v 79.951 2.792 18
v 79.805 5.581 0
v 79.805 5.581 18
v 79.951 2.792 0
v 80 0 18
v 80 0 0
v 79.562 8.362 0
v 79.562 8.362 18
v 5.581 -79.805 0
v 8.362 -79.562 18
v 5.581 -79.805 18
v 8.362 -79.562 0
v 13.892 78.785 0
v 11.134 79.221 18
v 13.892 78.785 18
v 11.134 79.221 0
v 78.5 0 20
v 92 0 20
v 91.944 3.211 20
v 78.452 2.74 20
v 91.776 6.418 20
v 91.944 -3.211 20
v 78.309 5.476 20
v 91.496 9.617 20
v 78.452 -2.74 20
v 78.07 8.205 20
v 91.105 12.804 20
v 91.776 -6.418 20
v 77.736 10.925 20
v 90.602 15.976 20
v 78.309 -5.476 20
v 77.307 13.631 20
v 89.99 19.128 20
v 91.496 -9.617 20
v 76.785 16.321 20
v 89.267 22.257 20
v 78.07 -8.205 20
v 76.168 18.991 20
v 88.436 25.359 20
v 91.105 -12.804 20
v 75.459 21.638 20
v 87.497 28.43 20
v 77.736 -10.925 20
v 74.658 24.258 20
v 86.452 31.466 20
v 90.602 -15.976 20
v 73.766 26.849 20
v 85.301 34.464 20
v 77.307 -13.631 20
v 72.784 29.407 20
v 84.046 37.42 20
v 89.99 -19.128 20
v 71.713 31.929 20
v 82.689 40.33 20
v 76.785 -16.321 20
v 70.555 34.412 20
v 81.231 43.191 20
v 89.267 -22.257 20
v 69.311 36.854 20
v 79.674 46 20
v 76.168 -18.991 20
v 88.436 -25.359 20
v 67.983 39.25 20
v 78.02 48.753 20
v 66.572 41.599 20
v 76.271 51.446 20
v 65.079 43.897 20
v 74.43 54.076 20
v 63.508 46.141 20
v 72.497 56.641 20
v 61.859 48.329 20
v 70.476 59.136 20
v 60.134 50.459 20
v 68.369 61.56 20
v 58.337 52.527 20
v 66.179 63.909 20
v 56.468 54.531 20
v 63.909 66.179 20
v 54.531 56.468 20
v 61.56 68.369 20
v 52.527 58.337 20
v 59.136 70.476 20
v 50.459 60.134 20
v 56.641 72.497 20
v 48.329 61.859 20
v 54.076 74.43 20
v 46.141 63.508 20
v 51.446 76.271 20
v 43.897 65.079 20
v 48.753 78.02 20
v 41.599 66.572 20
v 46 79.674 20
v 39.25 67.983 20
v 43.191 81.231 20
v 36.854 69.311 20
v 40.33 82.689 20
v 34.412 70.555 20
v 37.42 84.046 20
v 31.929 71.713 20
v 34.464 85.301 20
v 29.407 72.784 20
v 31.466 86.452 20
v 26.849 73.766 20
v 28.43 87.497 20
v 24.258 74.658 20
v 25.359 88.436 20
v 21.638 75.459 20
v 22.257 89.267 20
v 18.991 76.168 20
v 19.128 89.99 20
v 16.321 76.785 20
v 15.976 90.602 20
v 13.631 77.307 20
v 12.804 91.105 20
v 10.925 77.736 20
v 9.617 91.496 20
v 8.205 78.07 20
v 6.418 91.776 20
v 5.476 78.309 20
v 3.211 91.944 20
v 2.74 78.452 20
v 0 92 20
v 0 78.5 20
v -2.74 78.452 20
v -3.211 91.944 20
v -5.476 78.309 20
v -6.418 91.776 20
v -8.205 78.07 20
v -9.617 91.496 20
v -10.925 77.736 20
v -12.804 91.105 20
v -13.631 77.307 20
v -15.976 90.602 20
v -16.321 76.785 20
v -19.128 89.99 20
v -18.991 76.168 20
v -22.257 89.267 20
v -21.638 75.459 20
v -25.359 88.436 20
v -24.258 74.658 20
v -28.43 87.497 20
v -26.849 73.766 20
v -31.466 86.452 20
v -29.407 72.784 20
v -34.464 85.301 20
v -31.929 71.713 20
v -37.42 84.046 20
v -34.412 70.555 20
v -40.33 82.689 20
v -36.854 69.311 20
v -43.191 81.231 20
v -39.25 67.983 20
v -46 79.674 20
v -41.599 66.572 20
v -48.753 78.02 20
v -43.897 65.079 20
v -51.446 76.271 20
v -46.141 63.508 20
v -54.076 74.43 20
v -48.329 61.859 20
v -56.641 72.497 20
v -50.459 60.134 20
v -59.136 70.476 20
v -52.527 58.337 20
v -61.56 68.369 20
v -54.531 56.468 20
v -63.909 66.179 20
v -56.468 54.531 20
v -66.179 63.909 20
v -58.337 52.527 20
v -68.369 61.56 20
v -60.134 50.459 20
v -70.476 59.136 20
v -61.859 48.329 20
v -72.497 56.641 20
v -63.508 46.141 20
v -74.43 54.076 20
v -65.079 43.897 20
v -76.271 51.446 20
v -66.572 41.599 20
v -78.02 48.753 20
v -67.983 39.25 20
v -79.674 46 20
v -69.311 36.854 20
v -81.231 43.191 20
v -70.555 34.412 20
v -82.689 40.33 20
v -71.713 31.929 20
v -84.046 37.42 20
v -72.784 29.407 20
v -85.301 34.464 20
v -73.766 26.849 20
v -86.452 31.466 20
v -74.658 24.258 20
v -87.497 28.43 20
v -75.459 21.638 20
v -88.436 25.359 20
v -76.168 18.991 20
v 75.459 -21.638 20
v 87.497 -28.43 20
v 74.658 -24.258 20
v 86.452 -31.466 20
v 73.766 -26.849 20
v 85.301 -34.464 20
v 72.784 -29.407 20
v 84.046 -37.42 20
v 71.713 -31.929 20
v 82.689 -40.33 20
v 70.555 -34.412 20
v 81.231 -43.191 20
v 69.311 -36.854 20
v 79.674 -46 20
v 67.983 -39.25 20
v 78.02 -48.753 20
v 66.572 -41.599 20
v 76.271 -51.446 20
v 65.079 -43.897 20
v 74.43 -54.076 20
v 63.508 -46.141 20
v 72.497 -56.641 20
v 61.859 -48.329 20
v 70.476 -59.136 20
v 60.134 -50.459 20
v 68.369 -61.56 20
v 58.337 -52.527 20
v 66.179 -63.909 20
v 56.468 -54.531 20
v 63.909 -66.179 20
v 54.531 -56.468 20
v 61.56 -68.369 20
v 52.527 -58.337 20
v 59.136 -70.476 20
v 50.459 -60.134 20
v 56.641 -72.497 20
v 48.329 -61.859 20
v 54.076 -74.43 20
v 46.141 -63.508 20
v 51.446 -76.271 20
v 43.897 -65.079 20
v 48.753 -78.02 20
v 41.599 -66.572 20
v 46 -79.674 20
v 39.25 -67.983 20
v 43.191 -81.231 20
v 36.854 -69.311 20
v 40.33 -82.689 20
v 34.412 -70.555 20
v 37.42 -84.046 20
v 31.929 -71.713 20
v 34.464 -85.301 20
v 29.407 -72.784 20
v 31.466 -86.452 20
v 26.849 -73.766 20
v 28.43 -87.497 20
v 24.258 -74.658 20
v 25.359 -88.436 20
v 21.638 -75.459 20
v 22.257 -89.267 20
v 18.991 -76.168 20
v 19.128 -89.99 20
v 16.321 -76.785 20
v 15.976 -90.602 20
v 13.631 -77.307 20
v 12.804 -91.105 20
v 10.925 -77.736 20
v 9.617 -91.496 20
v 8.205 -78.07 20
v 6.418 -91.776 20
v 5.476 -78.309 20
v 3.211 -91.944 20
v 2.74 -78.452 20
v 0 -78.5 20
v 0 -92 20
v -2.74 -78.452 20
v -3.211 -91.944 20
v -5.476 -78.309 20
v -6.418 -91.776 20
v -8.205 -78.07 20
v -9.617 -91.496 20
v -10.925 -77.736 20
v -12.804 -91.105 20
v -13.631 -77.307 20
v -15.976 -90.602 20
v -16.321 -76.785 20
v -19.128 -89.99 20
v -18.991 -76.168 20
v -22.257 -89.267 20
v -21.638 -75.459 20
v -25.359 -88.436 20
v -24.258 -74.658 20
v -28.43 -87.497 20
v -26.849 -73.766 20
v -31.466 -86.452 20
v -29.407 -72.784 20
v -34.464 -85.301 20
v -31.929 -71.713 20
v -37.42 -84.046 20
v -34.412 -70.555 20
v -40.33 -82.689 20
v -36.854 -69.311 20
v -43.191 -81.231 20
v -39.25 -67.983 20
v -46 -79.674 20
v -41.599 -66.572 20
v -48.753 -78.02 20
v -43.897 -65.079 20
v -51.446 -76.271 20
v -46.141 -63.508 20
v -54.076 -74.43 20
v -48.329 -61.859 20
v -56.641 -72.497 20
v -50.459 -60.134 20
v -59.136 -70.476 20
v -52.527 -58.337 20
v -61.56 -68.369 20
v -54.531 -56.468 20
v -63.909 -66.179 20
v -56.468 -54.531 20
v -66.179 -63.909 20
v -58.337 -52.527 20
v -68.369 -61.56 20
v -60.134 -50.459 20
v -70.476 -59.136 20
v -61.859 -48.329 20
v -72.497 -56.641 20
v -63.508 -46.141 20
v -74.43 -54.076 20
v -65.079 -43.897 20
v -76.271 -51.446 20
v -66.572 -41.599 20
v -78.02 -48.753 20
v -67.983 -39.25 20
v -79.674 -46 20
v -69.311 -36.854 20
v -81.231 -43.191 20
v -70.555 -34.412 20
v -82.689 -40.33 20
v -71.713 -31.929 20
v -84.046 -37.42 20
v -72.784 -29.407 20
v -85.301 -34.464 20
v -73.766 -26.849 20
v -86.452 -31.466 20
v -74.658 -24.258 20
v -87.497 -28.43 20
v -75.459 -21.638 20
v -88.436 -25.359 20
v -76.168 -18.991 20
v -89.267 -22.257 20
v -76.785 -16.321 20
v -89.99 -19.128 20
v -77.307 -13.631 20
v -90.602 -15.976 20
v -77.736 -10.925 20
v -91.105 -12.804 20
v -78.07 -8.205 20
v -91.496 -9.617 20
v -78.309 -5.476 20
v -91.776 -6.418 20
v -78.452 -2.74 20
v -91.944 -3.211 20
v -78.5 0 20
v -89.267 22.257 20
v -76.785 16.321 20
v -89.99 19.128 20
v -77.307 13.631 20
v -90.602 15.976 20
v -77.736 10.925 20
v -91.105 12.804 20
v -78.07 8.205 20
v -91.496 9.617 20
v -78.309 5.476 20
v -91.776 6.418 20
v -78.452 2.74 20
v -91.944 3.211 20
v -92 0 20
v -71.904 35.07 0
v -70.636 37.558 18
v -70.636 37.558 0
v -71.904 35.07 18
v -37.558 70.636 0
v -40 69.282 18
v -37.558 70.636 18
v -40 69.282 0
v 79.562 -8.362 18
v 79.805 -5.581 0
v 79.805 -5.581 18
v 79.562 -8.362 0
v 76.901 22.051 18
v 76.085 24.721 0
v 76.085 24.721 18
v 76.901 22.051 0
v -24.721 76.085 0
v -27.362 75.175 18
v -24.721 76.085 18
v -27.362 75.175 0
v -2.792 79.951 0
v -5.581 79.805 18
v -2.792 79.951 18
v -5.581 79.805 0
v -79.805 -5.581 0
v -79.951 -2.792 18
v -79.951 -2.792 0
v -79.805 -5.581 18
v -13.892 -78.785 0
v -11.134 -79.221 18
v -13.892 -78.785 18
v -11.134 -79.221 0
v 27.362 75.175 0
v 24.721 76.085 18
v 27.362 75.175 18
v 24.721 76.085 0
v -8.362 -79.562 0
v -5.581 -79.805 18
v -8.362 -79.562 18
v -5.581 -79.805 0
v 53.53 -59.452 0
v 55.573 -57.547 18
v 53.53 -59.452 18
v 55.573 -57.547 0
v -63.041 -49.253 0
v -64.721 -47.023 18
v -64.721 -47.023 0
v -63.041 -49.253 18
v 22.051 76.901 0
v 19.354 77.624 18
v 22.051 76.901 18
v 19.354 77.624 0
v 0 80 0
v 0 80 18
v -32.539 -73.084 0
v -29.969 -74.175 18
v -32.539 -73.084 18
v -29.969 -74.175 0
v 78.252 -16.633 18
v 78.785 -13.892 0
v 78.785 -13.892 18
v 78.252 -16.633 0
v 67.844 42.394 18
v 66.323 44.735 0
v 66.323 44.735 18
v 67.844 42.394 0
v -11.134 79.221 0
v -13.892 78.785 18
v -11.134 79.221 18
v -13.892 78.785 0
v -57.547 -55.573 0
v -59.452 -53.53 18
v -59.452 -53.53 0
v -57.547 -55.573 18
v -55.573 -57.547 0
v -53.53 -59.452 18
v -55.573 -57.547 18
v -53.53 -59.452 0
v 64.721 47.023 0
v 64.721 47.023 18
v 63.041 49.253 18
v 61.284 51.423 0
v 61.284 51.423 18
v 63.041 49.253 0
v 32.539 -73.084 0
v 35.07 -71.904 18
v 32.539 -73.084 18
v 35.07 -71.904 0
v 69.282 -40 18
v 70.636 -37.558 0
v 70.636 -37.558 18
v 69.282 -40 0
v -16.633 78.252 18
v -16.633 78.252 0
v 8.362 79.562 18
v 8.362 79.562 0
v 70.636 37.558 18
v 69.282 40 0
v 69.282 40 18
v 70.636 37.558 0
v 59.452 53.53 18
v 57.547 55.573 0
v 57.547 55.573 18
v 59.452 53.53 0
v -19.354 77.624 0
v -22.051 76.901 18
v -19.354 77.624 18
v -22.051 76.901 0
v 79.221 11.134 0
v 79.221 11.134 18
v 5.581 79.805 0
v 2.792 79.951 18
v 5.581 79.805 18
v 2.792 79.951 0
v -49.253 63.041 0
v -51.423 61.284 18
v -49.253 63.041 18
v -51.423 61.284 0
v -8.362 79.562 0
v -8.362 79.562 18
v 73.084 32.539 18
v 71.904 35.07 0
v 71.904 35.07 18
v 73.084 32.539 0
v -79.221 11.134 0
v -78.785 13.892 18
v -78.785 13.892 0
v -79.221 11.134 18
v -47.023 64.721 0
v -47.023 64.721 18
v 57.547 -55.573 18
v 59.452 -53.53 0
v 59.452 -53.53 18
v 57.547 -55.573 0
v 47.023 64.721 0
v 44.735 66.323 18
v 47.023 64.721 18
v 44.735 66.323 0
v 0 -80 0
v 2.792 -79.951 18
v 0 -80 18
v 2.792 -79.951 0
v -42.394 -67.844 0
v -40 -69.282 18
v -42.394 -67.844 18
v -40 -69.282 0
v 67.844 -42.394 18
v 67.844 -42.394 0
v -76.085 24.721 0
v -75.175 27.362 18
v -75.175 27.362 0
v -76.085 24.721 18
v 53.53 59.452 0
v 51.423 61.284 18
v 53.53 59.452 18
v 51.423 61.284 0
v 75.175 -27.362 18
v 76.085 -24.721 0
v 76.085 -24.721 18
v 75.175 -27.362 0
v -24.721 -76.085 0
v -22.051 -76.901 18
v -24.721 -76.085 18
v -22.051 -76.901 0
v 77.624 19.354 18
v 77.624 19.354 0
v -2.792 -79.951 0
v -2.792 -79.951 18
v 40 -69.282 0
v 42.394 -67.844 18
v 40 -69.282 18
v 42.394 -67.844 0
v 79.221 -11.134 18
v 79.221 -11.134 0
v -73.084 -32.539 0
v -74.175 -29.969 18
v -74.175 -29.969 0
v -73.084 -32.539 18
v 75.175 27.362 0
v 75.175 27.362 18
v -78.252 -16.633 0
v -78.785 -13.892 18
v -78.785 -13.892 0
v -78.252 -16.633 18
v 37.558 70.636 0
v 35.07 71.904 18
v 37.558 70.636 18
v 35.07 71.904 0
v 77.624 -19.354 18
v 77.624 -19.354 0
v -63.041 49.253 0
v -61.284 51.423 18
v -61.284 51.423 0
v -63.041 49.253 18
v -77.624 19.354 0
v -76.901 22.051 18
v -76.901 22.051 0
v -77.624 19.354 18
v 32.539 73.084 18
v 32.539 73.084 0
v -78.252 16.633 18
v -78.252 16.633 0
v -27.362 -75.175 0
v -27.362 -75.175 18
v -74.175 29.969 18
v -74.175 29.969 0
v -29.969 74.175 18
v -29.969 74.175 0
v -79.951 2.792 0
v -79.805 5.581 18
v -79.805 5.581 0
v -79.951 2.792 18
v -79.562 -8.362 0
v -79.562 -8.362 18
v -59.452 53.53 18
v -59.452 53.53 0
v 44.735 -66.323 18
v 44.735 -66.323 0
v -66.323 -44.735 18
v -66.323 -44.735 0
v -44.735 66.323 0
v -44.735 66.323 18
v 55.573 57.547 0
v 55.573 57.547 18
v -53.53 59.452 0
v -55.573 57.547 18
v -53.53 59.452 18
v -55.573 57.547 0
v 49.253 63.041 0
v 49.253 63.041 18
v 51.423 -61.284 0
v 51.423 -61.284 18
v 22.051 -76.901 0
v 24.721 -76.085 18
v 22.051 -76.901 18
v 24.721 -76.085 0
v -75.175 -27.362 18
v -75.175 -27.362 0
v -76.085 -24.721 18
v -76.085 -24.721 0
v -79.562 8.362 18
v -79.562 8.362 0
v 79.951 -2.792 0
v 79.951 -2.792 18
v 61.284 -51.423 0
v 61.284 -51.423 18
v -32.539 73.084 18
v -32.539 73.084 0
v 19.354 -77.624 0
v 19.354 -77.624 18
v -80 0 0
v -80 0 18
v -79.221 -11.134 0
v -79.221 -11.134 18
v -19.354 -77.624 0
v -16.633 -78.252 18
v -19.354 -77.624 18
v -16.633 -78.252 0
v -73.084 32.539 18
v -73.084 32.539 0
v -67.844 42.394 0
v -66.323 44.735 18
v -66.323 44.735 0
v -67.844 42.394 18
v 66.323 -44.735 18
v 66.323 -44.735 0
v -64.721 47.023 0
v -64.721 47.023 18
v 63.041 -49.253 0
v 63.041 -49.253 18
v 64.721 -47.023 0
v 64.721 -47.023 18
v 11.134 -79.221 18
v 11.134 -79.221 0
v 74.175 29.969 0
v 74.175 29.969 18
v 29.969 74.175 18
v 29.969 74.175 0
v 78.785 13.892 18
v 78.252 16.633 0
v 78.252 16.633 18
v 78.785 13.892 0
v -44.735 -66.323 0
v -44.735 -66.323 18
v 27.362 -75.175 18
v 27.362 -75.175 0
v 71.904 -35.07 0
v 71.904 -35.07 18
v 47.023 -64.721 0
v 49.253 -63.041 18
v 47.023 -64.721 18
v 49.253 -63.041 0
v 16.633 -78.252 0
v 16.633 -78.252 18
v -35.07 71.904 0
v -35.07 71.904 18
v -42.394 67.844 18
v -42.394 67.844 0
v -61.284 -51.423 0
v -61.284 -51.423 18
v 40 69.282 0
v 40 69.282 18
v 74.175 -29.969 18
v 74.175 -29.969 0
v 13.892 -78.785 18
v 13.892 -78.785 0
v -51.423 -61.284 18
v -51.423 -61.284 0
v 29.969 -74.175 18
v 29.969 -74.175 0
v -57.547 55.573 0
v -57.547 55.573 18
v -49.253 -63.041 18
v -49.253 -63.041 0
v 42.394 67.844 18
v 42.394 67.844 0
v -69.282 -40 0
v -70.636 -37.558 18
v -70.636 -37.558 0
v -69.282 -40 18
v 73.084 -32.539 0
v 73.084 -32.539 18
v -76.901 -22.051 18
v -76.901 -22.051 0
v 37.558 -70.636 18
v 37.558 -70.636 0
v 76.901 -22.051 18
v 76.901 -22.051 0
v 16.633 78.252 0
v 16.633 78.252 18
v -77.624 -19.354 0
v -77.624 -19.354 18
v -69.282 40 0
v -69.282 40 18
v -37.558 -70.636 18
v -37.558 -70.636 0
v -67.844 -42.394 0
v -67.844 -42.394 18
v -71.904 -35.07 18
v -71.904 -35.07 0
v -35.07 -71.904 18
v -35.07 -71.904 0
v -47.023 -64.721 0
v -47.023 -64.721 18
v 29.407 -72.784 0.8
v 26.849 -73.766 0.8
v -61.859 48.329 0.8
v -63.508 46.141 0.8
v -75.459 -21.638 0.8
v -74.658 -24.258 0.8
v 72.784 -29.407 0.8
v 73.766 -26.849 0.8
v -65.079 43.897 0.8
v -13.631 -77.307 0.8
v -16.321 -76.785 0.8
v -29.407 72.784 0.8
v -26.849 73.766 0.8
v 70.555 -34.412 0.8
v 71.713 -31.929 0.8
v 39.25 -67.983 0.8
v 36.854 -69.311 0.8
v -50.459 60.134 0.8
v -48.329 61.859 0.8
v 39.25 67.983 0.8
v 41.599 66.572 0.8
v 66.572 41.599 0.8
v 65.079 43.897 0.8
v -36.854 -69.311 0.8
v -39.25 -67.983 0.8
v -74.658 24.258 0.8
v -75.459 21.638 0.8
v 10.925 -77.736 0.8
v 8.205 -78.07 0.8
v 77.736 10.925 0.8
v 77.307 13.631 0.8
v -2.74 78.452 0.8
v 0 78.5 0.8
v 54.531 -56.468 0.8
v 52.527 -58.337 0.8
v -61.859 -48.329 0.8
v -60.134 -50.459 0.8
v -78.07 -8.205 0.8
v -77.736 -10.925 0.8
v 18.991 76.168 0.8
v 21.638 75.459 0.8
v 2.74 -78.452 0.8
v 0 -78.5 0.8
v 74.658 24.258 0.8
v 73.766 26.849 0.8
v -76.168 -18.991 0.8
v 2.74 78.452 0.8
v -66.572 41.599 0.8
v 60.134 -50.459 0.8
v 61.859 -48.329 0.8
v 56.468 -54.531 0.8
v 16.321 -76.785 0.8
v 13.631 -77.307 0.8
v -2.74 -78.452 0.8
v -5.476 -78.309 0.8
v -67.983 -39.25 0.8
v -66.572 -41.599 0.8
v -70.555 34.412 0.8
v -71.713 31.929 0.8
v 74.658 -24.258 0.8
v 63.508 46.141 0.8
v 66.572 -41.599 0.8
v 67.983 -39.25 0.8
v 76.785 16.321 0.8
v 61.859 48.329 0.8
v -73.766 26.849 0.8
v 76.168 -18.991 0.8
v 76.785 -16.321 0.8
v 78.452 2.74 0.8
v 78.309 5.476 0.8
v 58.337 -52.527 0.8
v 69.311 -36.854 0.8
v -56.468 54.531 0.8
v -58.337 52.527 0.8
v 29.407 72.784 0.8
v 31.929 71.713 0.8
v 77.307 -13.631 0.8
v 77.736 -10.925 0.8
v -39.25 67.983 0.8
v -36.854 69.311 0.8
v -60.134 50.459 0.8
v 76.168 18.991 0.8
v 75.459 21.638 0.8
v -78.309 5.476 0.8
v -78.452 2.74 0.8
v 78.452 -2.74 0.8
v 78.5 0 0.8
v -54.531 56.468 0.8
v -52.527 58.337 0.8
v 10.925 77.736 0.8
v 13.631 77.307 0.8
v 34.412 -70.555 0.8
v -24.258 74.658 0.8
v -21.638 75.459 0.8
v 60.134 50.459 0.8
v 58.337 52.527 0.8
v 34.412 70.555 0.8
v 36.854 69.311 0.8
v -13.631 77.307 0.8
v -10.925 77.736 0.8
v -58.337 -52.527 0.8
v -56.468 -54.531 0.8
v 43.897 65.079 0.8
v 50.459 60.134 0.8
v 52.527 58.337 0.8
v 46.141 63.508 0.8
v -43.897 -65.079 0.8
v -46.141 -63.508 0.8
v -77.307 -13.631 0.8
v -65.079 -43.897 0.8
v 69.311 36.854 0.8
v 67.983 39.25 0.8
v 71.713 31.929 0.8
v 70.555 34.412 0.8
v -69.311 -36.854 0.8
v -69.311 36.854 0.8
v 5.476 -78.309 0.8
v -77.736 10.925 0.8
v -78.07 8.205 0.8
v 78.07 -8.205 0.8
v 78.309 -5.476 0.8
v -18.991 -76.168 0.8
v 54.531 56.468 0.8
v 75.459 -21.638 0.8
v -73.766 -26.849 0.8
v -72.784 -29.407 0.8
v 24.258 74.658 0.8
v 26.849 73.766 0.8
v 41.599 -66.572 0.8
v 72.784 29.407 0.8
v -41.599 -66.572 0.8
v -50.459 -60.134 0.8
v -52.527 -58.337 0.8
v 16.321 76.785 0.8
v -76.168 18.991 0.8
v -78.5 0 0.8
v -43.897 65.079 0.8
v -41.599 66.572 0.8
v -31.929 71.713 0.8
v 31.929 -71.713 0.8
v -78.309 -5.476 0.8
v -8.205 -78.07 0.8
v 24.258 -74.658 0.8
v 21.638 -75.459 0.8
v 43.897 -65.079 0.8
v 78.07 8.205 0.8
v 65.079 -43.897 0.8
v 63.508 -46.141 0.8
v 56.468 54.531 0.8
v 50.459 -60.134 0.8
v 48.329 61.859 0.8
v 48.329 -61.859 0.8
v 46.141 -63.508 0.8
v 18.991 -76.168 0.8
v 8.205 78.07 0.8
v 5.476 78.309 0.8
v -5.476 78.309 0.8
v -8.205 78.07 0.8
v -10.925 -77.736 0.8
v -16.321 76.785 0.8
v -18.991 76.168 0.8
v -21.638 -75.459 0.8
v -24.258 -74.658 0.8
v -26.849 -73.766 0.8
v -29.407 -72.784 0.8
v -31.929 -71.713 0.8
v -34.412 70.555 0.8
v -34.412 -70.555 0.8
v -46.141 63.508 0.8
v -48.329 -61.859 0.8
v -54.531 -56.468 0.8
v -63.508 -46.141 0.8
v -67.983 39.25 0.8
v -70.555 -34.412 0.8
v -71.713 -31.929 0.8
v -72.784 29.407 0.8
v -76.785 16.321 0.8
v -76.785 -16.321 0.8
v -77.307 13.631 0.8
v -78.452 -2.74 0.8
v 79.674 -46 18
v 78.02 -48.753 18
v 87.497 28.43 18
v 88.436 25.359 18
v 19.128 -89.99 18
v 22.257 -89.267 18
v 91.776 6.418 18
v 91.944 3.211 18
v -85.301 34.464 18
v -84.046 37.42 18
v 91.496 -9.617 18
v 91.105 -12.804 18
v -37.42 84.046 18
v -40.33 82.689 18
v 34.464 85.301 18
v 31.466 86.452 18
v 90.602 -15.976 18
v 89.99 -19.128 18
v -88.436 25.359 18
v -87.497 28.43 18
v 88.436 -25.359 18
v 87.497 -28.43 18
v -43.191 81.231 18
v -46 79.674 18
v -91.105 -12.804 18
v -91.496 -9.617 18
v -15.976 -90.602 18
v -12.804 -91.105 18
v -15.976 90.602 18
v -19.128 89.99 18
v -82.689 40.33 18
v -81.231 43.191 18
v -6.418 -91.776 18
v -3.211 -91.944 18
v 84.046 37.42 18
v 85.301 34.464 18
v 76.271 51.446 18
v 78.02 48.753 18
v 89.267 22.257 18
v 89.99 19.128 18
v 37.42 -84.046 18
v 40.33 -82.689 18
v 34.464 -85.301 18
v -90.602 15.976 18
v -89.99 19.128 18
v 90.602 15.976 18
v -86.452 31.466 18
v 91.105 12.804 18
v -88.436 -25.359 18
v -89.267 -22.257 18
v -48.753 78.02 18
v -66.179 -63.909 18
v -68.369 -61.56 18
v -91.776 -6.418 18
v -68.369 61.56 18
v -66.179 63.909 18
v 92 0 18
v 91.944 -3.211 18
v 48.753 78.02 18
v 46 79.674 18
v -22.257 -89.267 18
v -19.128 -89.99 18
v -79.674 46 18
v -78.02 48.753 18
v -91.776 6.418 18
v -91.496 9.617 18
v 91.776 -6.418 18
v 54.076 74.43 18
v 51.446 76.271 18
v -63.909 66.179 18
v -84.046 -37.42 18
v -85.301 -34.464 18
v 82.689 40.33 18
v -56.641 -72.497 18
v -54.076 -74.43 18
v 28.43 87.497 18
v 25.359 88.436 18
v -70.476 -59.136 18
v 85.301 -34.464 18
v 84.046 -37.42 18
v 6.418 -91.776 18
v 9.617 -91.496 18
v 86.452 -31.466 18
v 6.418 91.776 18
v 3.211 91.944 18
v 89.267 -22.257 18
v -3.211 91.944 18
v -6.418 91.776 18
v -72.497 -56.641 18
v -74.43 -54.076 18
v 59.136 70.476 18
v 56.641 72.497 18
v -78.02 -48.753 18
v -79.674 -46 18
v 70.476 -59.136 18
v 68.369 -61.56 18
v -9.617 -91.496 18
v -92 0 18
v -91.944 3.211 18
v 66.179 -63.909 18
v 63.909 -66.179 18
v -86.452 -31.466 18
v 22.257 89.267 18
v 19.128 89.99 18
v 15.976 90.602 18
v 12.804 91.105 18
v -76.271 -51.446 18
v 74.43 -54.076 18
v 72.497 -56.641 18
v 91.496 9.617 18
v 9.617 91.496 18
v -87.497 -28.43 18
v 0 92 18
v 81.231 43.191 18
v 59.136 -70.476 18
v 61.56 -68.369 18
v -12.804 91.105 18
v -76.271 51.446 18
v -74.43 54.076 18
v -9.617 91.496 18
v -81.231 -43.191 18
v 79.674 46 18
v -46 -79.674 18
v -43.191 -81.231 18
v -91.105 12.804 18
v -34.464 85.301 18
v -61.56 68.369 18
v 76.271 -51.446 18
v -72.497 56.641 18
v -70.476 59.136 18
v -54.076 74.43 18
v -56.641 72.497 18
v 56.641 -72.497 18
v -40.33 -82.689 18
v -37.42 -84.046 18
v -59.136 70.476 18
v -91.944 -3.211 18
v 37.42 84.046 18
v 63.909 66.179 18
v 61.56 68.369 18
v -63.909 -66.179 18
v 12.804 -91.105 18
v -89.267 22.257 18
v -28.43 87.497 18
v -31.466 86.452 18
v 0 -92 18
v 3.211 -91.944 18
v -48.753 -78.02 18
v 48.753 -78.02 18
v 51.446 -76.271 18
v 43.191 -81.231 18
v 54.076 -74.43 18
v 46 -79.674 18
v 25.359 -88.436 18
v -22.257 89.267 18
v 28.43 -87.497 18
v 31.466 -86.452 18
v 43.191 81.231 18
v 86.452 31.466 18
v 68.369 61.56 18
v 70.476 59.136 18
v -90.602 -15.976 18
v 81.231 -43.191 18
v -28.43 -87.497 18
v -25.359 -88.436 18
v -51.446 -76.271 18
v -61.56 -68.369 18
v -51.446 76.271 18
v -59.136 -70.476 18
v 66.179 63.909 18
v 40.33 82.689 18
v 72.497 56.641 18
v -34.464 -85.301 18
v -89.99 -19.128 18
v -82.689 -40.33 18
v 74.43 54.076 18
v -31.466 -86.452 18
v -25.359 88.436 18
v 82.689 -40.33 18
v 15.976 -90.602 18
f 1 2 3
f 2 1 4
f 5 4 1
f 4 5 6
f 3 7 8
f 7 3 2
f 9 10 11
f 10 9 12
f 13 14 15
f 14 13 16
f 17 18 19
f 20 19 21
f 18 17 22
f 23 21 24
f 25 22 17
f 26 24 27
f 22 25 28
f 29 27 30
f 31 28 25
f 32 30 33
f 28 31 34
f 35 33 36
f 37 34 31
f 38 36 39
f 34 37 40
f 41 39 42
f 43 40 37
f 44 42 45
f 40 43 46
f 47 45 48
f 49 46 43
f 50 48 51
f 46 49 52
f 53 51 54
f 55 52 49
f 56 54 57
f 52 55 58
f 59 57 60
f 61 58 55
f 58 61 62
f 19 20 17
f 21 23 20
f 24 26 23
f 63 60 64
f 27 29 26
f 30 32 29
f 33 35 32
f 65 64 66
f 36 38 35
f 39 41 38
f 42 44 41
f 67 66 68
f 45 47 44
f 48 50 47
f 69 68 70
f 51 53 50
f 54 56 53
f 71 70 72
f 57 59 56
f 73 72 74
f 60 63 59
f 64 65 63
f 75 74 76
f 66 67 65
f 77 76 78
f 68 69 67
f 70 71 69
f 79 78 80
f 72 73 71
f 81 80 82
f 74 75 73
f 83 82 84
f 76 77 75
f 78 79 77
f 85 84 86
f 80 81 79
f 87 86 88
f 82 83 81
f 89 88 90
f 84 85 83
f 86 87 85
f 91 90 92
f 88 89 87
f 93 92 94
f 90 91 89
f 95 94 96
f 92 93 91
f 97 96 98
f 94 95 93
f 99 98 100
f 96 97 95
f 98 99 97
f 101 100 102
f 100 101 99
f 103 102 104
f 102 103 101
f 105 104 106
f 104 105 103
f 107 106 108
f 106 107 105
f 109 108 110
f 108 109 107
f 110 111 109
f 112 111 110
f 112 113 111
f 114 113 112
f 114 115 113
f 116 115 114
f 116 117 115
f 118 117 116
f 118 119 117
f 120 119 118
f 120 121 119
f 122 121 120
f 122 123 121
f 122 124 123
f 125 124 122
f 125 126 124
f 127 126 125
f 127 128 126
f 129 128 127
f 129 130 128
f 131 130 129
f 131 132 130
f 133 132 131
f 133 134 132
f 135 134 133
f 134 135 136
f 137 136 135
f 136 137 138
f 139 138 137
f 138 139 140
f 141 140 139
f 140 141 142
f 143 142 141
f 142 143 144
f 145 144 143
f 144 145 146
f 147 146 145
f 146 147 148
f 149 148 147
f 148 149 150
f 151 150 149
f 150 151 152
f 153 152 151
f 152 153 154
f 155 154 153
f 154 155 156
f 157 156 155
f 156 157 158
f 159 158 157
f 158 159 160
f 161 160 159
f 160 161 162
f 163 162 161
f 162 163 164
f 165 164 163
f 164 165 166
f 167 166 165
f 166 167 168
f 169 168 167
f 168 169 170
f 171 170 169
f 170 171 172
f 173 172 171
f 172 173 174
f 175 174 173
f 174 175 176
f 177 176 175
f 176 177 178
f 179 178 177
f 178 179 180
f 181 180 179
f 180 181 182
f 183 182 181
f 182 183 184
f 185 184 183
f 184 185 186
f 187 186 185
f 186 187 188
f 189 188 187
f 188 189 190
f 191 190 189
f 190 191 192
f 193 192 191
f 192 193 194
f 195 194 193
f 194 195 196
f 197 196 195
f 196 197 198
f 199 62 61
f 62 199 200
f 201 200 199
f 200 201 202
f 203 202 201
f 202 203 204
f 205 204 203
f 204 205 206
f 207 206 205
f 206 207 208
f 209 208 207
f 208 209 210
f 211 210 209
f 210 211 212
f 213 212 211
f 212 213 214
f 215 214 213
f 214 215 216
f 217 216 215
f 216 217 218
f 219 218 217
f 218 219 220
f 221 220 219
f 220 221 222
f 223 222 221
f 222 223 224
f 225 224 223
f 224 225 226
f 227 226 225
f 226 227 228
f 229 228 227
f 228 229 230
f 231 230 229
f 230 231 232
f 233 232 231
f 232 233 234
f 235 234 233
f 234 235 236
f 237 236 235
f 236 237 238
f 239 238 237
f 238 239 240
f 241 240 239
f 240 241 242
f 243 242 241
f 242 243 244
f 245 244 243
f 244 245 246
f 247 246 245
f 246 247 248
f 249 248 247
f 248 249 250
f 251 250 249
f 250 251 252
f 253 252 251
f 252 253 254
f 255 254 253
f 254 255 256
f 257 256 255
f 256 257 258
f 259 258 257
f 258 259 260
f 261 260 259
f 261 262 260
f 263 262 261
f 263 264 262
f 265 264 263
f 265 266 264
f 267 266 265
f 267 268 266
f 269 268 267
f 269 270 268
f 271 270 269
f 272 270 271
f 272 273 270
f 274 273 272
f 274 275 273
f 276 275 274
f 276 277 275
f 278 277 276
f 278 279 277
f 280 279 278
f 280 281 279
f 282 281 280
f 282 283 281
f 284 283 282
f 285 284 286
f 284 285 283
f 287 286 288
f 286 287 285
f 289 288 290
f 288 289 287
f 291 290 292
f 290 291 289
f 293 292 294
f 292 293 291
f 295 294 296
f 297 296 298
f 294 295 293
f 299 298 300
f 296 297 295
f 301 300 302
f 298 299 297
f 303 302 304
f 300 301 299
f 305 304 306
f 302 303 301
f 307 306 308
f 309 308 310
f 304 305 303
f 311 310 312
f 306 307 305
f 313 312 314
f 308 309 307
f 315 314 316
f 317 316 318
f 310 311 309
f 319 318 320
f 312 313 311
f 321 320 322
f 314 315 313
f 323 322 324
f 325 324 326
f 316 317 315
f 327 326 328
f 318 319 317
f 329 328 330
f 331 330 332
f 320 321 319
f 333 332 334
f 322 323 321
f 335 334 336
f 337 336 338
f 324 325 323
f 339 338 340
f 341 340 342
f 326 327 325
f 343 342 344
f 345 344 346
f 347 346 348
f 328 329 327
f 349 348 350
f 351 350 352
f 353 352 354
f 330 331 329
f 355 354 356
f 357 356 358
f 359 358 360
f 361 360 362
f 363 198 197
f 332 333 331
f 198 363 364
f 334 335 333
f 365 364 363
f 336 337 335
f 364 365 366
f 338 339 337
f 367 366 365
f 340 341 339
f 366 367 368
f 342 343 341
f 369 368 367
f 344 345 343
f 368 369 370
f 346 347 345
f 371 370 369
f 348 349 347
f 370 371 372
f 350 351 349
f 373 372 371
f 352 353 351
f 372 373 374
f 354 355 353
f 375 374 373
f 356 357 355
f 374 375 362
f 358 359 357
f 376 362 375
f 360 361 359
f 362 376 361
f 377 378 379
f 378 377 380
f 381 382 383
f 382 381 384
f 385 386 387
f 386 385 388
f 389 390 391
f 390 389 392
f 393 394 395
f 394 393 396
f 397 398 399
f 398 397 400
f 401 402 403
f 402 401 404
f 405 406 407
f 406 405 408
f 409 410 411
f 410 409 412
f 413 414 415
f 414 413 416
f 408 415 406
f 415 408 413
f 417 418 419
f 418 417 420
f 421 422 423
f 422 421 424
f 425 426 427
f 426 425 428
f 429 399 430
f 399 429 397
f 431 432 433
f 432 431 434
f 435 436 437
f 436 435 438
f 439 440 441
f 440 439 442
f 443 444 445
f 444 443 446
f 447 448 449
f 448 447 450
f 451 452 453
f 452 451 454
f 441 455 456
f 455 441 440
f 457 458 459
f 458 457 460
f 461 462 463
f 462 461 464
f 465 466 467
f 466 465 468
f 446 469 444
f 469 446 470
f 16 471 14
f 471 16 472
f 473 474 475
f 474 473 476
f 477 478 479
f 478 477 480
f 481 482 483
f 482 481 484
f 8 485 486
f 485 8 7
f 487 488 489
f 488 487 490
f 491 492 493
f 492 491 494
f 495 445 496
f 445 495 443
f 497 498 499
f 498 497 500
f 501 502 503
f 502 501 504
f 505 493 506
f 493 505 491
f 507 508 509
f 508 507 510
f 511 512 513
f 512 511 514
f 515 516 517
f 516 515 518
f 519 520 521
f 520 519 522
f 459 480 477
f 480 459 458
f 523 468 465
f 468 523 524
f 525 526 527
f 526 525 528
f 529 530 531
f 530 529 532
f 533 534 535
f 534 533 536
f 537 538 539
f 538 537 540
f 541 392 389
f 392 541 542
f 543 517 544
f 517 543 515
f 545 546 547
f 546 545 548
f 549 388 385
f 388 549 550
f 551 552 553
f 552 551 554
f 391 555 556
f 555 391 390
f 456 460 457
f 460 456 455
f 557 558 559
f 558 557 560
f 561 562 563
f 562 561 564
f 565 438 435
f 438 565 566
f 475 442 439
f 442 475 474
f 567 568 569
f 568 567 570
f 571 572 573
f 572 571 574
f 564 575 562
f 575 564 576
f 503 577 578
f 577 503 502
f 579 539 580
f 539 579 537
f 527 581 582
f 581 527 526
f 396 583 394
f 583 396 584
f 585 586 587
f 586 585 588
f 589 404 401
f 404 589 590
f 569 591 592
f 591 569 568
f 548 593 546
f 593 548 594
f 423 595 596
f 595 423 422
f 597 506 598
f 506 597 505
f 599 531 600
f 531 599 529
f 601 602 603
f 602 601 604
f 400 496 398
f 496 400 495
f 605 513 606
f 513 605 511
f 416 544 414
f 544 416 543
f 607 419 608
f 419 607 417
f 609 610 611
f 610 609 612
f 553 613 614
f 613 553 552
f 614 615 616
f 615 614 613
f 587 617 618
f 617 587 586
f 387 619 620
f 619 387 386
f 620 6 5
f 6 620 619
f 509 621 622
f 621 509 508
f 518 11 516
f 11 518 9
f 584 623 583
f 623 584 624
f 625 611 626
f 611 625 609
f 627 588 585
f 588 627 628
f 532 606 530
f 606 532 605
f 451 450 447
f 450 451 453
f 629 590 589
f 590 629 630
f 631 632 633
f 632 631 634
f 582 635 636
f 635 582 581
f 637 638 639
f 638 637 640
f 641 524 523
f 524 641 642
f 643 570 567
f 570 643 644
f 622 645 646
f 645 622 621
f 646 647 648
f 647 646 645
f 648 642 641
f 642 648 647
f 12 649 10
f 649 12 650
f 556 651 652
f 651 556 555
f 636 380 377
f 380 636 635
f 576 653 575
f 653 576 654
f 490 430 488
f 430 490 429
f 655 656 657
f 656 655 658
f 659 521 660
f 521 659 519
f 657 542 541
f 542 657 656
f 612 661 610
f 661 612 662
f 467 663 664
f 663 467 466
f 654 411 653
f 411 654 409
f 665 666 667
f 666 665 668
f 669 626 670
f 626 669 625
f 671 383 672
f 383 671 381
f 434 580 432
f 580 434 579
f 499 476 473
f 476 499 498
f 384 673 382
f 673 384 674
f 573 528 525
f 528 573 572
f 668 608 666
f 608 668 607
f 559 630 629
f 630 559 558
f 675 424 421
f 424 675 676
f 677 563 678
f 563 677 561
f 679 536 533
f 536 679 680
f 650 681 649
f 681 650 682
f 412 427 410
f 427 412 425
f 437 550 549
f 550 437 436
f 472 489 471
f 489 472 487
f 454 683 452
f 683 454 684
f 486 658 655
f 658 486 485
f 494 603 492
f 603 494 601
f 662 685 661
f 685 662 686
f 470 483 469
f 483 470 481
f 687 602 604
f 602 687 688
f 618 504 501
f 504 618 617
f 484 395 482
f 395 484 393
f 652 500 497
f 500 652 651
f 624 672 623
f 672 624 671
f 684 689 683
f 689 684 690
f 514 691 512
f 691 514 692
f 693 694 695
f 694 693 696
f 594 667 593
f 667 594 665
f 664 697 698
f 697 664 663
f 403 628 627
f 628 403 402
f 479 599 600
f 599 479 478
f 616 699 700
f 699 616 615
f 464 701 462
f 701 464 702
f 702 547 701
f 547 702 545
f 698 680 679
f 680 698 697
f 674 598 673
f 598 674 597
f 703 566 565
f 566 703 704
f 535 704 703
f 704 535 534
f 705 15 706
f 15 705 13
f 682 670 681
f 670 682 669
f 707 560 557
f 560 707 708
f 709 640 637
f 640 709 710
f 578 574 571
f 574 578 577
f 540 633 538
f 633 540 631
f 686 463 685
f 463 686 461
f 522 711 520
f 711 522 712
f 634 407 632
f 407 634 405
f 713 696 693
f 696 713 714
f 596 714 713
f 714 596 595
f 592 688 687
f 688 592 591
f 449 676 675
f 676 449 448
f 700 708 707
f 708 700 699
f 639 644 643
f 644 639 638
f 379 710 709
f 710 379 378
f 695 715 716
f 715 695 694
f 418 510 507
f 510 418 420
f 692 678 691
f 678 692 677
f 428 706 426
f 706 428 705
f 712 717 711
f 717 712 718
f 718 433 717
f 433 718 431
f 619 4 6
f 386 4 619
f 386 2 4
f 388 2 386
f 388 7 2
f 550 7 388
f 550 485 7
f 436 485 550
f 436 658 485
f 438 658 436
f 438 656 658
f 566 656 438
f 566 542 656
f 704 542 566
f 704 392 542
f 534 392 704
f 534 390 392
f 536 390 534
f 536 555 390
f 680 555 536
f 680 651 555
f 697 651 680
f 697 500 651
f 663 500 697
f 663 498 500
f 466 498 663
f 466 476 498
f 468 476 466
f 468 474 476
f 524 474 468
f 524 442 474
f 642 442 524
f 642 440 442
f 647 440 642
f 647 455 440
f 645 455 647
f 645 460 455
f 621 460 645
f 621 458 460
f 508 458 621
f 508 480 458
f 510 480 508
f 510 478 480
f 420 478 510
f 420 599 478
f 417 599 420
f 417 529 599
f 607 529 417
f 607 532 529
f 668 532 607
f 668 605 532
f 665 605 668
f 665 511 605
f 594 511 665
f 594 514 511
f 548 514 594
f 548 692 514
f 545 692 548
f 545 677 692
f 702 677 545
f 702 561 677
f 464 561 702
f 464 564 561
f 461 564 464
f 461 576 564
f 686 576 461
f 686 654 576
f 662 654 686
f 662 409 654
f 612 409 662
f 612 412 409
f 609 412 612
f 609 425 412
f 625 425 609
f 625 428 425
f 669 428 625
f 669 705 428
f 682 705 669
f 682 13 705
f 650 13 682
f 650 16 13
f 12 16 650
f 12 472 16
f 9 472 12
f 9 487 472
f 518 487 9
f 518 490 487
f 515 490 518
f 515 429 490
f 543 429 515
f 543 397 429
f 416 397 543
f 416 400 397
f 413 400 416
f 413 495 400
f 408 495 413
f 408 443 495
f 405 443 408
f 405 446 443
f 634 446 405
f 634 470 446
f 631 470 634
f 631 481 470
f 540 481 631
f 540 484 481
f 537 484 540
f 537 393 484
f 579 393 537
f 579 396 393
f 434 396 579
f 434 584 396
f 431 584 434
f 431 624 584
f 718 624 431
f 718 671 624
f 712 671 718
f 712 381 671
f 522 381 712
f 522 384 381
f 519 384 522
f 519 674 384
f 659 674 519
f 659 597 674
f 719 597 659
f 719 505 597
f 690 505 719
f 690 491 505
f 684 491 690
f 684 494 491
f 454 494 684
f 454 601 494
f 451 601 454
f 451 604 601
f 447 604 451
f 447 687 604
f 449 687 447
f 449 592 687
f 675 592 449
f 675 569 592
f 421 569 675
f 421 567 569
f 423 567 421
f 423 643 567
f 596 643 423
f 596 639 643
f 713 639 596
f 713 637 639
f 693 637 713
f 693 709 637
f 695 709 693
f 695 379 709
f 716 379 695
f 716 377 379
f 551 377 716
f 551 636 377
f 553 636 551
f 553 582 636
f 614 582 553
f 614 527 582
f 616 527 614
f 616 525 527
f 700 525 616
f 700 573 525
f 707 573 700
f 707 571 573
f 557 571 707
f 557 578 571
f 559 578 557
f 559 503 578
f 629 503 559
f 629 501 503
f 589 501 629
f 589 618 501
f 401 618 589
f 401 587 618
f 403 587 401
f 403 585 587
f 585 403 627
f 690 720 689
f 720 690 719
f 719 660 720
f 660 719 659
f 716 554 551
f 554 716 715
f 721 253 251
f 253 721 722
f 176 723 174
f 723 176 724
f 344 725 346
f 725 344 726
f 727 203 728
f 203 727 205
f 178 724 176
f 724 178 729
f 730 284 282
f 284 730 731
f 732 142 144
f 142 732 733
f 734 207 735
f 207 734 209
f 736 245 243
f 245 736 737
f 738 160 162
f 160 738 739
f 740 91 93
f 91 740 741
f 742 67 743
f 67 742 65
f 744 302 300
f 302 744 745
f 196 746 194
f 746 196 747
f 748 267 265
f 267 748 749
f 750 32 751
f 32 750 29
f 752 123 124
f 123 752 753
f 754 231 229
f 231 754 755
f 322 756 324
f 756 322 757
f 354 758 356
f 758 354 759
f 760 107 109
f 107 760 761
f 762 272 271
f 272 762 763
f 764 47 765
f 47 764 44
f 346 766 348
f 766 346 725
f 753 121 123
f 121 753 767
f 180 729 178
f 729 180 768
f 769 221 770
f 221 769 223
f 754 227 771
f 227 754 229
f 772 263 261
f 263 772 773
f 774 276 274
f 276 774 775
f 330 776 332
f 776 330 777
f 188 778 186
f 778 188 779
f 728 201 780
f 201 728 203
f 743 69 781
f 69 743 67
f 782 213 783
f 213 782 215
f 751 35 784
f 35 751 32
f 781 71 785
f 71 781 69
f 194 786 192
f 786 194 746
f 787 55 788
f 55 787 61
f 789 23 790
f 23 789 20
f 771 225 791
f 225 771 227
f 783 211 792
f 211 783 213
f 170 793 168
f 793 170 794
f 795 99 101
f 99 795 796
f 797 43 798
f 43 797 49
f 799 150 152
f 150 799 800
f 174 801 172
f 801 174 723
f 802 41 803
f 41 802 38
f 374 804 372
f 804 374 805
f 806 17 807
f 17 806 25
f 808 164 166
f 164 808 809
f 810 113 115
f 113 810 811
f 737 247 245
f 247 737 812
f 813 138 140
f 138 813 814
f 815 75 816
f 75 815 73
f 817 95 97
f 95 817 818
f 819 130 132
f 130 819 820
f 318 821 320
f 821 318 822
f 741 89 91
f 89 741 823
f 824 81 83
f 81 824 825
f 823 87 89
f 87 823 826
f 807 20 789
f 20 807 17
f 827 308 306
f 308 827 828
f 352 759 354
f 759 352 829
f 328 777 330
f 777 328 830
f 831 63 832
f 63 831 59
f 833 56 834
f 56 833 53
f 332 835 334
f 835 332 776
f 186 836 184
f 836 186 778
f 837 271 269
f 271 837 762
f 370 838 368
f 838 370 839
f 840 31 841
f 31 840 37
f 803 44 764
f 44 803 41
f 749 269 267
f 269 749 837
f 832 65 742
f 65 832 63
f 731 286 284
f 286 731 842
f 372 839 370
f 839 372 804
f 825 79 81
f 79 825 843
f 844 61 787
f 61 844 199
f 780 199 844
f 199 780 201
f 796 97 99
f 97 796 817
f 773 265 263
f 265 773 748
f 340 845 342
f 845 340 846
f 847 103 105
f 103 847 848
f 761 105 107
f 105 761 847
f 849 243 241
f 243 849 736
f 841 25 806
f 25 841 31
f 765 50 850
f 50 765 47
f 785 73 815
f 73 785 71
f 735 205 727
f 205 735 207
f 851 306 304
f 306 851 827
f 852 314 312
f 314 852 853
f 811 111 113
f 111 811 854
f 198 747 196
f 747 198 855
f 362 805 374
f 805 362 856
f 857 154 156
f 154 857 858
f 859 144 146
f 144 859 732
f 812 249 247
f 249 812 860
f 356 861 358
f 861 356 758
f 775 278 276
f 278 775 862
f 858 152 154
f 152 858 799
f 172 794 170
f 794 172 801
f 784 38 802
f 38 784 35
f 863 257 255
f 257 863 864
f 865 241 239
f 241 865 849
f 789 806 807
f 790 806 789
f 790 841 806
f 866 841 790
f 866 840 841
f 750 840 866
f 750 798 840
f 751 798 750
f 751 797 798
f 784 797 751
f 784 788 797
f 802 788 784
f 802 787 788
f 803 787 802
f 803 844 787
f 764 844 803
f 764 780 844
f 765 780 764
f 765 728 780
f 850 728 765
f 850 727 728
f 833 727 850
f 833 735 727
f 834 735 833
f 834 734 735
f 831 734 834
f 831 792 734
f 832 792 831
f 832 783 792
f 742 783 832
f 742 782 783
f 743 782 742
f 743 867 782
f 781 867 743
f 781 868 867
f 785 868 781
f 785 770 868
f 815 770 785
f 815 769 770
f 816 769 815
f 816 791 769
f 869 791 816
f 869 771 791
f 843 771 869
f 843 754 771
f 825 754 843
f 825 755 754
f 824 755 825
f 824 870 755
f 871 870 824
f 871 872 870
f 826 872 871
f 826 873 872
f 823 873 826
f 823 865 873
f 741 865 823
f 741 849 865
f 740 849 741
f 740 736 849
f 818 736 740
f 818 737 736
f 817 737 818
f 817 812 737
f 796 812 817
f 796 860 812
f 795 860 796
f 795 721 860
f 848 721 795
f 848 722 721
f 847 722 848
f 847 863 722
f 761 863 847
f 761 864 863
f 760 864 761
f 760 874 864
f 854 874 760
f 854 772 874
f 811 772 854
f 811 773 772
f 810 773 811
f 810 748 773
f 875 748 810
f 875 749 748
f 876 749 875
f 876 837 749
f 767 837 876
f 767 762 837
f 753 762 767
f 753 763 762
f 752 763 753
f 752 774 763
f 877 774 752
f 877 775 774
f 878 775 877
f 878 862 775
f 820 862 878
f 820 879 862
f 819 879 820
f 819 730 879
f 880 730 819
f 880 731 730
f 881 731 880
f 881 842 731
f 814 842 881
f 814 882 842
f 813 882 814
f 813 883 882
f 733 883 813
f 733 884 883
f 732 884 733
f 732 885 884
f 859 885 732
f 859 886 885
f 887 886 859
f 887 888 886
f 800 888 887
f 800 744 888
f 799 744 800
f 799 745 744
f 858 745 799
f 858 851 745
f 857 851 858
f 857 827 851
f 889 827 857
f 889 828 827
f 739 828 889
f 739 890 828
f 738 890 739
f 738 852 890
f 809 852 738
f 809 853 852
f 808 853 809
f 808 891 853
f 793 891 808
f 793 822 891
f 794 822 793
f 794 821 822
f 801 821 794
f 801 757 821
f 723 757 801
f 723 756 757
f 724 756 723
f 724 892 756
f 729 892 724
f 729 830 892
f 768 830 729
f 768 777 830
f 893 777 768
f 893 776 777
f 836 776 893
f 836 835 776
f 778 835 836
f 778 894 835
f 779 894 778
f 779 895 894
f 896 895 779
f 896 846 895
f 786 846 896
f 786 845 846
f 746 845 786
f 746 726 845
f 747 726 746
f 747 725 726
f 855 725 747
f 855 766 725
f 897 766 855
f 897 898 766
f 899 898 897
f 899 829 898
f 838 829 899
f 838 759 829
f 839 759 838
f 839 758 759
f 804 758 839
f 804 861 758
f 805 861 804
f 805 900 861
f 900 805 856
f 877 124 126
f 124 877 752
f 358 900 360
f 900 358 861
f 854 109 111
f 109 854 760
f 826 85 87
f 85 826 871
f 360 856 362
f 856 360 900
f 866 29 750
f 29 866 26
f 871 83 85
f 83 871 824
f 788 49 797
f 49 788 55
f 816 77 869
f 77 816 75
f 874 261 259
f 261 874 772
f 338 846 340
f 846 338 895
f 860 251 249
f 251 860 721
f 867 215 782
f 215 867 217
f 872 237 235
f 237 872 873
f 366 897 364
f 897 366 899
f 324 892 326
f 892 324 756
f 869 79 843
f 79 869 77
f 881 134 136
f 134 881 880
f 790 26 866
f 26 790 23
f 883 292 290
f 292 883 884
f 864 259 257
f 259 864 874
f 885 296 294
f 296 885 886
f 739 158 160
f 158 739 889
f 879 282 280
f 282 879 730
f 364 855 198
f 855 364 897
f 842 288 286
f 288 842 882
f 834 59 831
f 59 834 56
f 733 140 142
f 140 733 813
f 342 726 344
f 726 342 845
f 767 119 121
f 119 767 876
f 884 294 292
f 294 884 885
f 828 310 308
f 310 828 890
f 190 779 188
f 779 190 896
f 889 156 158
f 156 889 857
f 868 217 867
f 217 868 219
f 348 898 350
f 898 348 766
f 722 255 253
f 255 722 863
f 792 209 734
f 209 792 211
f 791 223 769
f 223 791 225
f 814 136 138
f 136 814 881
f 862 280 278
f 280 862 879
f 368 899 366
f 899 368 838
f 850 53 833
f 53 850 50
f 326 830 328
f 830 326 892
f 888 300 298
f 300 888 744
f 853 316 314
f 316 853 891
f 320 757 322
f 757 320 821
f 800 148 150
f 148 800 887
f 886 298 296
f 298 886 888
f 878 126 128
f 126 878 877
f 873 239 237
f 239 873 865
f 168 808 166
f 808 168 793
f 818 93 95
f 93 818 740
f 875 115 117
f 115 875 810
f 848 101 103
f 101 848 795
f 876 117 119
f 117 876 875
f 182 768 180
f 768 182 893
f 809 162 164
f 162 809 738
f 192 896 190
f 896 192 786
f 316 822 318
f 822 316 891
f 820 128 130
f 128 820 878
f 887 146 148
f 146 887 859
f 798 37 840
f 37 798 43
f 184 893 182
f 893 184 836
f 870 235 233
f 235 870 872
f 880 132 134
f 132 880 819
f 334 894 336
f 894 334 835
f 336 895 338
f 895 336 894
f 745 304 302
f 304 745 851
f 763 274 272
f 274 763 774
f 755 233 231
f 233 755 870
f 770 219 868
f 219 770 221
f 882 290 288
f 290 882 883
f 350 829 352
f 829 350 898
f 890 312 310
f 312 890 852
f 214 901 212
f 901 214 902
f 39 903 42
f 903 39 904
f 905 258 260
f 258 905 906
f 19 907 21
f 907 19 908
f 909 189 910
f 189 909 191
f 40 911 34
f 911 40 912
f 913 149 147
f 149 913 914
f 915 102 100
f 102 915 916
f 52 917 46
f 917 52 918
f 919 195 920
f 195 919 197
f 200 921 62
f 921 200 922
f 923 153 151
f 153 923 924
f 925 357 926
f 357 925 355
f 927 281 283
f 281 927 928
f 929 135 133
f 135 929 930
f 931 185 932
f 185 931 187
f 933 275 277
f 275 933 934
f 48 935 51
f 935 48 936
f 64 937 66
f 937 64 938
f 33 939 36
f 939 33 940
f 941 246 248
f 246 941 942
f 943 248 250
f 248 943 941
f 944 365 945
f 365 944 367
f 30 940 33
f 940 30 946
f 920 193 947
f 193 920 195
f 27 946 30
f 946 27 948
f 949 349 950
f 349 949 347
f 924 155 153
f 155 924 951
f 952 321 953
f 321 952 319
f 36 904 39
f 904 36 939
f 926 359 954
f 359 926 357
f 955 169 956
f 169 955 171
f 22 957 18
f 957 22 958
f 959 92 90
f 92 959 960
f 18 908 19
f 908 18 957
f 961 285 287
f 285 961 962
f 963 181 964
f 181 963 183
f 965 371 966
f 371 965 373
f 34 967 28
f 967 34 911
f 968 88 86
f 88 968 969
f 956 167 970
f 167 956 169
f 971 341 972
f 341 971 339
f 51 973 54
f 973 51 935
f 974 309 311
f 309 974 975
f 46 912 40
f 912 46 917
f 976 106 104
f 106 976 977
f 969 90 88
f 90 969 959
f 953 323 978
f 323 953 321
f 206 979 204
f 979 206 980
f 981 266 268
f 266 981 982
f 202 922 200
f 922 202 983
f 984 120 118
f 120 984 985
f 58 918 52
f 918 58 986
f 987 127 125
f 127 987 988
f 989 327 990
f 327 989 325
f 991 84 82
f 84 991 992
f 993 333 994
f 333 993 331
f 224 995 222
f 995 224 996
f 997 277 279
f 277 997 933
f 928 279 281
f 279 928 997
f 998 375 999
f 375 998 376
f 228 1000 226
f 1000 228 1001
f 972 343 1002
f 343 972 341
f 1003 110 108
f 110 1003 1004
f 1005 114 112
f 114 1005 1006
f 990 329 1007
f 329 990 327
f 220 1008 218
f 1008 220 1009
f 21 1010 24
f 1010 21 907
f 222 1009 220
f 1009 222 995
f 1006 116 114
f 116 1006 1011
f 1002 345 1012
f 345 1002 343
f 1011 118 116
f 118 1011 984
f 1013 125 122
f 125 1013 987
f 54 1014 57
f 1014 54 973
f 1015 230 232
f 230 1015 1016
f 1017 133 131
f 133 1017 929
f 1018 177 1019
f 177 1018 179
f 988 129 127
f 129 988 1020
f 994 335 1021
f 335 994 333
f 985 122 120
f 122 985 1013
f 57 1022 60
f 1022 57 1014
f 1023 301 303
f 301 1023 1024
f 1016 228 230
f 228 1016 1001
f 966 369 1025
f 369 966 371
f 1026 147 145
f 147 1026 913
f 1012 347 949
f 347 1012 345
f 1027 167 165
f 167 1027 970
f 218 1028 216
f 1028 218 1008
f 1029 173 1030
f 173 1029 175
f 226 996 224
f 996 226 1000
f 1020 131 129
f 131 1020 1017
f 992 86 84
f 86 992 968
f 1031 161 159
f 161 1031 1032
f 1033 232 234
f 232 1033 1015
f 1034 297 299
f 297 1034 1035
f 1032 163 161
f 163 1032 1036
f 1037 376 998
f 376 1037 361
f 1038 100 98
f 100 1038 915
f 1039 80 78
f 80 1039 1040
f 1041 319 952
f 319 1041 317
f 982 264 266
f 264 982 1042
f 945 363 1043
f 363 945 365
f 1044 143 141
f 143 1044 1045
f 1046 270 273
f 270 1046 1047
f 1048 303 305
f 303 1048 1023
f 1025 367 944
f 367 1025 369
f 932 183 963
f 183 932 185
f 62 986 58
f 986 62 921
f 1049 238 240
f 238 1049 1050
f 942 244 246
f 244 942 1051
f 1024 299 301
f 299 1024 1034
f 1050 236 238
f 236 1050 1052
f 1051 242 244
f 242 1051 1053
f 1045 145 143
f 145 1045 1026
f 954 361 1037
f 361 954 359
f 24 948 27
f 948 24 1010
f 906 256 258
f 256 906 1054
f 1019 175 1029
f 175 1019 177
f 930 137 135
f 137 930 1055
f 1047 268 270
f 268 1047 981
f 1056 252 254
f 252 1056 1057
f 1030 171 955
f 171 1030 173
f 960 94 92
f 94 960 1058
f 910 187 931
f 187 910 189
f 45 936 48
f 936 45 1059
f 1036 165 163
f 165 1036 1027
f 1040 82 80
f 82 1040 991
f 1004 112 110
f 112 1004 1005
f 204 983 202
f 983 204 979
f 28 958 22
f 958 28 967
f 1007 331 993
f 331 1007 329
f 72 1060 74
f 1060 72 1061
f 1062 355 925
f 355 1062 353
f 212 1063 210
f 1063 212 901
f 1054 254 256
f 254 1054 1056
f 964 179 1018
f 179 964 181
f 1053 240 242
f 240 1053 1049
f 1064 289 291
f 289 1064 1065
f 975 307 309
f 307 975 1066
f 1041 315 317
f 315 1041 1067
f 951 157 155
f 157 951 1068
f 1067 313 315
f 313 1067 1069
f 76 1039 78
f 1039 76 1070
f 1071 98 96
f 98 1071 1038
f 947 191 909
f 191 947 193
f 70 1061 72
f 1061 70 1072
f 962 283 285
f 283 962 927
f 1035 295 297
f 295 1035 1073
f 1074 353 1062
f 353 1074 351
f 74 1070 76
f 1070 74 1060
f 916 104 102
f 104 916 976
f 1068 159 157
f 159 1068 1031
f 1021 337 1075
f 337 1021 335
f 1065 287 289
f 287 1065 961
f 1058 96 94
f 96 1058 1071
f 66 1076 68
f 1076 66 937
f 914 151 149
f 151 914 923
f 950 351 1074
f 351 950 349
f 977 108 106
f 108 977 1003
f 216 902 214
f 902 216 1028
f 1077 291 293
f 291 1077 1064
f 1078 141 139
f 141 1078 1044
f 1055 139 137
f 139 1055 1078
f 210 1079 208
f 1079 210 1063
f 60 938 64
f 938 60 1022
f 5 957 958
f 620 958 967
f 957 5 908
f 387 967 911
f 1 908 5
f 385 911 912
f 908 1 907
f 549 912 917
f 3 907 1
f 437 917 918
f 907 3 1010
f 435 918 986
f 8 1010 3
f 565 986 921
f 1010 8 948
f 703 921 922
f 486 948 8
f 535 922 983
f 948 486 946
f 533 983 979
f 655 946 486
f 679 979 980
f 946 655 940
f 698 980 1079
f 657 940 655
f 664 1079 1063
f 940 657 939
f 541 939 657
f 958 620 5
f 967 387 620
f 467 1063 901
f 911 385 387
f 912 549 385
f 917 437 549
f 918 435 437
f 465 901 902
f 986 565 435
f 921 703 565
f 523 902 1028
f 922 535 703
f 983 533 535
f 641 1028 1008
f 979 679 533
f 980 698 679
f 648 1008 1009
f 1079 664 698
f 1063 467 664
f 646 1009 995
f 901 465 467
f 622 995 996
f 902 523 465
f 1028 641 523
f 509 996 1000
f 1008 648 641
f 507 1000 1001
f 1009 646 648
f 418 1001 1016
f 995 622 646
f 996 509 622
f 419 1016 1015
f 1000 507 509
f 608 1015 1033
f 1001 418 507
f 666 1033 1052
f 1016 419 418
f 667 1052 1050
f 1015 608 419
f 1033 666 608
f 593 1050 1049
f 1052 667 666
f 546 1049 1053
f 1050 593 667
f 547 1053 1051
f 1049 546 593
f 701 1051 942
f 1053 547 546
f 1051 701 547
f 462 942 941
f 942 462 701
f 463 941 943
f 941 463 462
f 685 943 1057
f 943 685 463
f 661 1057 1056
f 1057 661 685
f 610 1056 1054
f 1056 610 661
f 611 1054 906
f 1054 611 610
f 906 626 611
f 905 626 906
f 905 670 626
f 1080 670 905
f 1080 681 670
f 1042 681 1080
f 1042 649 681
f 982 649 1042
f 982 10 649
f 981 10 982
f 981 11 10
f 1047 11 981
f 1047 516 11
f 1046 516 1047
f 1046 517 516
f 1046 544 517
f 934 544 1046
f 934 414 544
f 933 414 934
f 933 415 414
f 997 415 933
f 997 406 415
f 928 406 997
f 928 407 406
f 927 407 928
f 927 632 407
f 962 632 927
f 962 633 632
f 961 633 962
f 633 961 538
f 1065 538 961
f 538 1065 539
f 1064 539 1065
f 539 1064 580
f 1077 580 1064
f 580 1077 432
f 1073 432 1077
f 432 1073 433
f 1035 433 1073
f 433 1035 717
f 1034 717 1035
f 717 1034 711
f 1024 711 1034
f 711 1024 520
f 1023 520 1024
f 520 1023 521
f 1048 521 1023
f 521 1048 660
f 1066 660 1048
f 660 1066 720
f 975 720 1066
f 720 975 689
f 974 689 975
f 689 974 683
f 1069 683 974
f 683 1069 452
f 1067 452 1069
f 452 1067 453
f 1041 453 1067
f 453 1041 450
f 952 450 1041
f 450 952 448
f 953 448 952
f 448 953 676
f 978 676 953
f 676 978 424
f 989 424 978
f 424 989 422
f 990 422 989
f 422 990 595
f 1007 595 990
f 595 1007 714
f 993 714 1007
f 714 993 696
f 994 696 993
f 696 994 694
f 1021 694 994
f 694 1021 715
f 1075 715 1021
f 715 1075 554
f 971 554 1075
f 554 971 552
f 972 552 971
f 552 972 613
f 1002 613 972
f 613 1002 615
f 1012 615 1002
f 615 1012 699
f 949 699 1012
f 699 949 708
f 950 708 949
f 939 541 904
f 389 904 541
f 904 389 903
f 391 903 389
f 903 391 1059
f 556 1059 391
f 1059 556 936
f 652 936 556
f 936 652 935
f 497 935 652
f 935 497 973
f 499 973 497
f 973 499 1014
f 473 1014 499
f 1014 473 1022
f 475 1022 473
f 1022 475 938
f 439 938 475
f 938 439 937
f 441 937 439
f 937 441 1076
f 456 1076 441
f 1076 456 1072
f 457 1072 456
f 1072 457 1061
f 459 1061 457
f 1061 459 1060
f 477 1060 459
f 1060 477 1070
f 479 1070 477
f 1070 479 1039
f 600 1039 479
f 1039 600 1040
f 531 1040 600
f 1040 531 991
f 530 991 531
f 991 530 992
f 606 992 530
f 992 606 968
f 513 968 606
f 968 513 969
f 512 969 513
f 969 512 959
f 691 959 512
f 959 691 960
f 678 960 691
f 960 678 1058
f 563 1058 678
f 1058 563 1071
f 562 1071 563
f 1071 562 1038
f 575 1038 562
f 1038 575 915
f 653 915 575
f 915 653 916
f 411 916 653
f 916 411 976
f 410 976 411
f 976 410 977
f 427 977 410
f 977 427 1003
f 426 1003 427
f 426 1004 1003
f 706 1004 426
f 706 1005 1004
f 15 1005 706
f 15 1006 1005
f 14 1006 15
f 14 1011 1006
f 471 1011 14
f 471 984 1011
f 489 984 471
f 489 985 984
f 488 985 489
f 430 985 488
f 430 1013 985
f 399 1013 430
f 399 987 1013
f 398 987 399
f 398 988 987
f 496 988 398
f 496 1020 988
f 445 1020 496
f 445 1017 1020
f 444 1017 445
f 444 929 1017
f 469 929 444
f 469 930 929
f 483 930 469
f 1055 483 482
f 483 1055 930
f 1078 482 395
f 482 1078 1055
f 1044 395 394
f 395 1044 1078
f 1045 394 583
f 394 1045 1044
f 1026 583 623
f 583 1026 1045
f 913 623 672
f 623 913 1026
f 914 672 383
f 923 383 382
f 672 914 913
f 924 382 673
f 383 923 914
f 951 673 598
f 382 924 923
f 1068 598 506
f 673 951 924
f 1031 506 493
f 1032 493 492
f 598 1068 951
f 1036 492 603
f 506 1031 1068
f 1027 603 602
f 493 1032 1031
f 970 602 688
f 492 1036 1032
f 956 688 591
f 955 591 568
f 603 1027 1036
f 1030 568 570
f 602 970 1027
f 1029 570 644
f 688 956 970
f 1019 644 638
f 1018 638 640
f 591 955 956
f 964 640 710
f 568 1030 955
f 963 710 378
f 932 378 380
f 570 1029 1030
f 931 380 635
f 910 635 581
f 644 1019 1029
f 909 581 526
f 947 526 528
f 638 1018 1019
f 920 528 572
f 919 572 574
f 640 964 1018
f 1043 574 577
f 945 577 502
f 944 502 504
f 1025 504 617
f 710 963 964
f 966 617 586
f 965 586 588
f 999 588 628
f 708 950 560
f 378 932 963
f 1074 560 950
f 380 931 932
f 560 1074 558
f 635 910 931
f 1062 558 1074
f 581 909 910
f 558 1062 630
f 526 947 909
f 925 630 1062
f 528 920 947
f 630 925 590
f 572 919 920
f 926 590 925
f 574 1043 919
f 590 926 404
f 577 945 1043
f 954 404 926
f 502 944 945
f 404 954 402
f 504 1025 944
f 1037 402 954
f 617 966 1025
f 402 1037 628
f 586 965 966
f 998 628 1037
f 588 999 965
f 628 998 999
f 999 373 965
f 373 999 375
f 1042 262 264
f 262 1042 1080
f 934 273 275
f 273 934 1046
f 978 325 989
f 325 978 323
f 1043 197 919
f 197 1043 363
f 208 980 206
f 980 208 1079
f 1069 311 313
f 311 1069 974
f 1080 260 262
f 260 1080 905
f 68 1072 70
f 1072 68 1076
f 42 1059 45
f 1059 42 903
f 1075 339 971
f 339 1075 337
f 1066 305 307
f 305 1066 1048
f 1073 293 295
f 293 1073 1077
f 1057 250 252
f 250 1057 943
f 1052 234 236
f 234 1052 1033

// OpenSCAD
// === DESCRIPTION ===
// Planter saucer: a round tray that sits under a 150 mm terracotta pot on a
// windowsill and catches the water that drains out after watering.
// Physical context: indoors on painted timber; it must hold up to ~150 ml of water
//   without leaking, and has a rim lip so it can be lifted with wet fingers.
//
// Design decisions:
//   - Printed upright, floor on the bed, so the inside surface is smooth.
//   - Thin walls and floor keep the print fast and light.
//   - A flat lip round the rim gives a grip to lift it.
//
// Terminology → code:
//   "tray"      → tray_d, tray_h, wall_t, floor_t, tray()
//   "lip"       → lip_w, lip_t, lip()
//
// Common modifications:
//   Bigger pot    → tray_d (keep tray_d <= 220 on an X1C with the cutter corner)
//   Deeper tray   → tray_h
//
// Overall dimensions: 184 x 184 x 20 mm (fits a Bambu X1C, 256^3)
// Coordinate system: X/Y = plan, Z = height off the bed
// NOTE: Model is in print orientation.

// === PRINT SETTINGS ===
// Material: PETG (water-resistant)
// Layer Height: 0.2mm
// Walls/Perimeters: 3
// Infill: 15% grid
// Supports: None required
// Orientation: As modeled, floor on the bed
// Notes: Dry PETG first

// === PARAMETERS ===
nozzle_diameter = 0.4;
layer_height = 0.2;

tray_d = 160;       // tray outside diameter
tray_h = 20;        // tray height
wall_t = 1.5;       // side wall thickness
floor_t = 0.8;      // floor thickness (4 layers)
lip_w = 12;         // lip width beyond the wall
lip_t = 2;          // lip thickness

// === DERIVED CONSTANTS ===
extrusion_width = nozzle_diameter * 1.125;
fudge = 0.01;
ef_chamfer = 0.4;
$fn = $preview ? 64 : 180;

assert(tray_d + 2 * lip_w <= 220, "fits inside the X1C's cutter-corner limit");
assert(tray_h <= 25, "no taller than 25 mm");

// === MODULES ===
module tray()
    difference() {
        cylinder(d = tray_d, h = tray_h);
        translate([0, 0, floor_t]) cylinder(d = tray_d - 2 * wall_t, h = tray_h);
    }

module lip()
    translate([0, 0, tray_h - lip_t])
        difference() {
            cylinder(d = tray_d + 2 * lip_w, h = lip_t);
            translate([0, 0, -fudge]) cylinder(d = tray_d - 2 * wall_t, h = lip_t + 2 * fudge);
        }

// === ASSEMBLY / RENDER ===
union() { tray(); lip(); }
